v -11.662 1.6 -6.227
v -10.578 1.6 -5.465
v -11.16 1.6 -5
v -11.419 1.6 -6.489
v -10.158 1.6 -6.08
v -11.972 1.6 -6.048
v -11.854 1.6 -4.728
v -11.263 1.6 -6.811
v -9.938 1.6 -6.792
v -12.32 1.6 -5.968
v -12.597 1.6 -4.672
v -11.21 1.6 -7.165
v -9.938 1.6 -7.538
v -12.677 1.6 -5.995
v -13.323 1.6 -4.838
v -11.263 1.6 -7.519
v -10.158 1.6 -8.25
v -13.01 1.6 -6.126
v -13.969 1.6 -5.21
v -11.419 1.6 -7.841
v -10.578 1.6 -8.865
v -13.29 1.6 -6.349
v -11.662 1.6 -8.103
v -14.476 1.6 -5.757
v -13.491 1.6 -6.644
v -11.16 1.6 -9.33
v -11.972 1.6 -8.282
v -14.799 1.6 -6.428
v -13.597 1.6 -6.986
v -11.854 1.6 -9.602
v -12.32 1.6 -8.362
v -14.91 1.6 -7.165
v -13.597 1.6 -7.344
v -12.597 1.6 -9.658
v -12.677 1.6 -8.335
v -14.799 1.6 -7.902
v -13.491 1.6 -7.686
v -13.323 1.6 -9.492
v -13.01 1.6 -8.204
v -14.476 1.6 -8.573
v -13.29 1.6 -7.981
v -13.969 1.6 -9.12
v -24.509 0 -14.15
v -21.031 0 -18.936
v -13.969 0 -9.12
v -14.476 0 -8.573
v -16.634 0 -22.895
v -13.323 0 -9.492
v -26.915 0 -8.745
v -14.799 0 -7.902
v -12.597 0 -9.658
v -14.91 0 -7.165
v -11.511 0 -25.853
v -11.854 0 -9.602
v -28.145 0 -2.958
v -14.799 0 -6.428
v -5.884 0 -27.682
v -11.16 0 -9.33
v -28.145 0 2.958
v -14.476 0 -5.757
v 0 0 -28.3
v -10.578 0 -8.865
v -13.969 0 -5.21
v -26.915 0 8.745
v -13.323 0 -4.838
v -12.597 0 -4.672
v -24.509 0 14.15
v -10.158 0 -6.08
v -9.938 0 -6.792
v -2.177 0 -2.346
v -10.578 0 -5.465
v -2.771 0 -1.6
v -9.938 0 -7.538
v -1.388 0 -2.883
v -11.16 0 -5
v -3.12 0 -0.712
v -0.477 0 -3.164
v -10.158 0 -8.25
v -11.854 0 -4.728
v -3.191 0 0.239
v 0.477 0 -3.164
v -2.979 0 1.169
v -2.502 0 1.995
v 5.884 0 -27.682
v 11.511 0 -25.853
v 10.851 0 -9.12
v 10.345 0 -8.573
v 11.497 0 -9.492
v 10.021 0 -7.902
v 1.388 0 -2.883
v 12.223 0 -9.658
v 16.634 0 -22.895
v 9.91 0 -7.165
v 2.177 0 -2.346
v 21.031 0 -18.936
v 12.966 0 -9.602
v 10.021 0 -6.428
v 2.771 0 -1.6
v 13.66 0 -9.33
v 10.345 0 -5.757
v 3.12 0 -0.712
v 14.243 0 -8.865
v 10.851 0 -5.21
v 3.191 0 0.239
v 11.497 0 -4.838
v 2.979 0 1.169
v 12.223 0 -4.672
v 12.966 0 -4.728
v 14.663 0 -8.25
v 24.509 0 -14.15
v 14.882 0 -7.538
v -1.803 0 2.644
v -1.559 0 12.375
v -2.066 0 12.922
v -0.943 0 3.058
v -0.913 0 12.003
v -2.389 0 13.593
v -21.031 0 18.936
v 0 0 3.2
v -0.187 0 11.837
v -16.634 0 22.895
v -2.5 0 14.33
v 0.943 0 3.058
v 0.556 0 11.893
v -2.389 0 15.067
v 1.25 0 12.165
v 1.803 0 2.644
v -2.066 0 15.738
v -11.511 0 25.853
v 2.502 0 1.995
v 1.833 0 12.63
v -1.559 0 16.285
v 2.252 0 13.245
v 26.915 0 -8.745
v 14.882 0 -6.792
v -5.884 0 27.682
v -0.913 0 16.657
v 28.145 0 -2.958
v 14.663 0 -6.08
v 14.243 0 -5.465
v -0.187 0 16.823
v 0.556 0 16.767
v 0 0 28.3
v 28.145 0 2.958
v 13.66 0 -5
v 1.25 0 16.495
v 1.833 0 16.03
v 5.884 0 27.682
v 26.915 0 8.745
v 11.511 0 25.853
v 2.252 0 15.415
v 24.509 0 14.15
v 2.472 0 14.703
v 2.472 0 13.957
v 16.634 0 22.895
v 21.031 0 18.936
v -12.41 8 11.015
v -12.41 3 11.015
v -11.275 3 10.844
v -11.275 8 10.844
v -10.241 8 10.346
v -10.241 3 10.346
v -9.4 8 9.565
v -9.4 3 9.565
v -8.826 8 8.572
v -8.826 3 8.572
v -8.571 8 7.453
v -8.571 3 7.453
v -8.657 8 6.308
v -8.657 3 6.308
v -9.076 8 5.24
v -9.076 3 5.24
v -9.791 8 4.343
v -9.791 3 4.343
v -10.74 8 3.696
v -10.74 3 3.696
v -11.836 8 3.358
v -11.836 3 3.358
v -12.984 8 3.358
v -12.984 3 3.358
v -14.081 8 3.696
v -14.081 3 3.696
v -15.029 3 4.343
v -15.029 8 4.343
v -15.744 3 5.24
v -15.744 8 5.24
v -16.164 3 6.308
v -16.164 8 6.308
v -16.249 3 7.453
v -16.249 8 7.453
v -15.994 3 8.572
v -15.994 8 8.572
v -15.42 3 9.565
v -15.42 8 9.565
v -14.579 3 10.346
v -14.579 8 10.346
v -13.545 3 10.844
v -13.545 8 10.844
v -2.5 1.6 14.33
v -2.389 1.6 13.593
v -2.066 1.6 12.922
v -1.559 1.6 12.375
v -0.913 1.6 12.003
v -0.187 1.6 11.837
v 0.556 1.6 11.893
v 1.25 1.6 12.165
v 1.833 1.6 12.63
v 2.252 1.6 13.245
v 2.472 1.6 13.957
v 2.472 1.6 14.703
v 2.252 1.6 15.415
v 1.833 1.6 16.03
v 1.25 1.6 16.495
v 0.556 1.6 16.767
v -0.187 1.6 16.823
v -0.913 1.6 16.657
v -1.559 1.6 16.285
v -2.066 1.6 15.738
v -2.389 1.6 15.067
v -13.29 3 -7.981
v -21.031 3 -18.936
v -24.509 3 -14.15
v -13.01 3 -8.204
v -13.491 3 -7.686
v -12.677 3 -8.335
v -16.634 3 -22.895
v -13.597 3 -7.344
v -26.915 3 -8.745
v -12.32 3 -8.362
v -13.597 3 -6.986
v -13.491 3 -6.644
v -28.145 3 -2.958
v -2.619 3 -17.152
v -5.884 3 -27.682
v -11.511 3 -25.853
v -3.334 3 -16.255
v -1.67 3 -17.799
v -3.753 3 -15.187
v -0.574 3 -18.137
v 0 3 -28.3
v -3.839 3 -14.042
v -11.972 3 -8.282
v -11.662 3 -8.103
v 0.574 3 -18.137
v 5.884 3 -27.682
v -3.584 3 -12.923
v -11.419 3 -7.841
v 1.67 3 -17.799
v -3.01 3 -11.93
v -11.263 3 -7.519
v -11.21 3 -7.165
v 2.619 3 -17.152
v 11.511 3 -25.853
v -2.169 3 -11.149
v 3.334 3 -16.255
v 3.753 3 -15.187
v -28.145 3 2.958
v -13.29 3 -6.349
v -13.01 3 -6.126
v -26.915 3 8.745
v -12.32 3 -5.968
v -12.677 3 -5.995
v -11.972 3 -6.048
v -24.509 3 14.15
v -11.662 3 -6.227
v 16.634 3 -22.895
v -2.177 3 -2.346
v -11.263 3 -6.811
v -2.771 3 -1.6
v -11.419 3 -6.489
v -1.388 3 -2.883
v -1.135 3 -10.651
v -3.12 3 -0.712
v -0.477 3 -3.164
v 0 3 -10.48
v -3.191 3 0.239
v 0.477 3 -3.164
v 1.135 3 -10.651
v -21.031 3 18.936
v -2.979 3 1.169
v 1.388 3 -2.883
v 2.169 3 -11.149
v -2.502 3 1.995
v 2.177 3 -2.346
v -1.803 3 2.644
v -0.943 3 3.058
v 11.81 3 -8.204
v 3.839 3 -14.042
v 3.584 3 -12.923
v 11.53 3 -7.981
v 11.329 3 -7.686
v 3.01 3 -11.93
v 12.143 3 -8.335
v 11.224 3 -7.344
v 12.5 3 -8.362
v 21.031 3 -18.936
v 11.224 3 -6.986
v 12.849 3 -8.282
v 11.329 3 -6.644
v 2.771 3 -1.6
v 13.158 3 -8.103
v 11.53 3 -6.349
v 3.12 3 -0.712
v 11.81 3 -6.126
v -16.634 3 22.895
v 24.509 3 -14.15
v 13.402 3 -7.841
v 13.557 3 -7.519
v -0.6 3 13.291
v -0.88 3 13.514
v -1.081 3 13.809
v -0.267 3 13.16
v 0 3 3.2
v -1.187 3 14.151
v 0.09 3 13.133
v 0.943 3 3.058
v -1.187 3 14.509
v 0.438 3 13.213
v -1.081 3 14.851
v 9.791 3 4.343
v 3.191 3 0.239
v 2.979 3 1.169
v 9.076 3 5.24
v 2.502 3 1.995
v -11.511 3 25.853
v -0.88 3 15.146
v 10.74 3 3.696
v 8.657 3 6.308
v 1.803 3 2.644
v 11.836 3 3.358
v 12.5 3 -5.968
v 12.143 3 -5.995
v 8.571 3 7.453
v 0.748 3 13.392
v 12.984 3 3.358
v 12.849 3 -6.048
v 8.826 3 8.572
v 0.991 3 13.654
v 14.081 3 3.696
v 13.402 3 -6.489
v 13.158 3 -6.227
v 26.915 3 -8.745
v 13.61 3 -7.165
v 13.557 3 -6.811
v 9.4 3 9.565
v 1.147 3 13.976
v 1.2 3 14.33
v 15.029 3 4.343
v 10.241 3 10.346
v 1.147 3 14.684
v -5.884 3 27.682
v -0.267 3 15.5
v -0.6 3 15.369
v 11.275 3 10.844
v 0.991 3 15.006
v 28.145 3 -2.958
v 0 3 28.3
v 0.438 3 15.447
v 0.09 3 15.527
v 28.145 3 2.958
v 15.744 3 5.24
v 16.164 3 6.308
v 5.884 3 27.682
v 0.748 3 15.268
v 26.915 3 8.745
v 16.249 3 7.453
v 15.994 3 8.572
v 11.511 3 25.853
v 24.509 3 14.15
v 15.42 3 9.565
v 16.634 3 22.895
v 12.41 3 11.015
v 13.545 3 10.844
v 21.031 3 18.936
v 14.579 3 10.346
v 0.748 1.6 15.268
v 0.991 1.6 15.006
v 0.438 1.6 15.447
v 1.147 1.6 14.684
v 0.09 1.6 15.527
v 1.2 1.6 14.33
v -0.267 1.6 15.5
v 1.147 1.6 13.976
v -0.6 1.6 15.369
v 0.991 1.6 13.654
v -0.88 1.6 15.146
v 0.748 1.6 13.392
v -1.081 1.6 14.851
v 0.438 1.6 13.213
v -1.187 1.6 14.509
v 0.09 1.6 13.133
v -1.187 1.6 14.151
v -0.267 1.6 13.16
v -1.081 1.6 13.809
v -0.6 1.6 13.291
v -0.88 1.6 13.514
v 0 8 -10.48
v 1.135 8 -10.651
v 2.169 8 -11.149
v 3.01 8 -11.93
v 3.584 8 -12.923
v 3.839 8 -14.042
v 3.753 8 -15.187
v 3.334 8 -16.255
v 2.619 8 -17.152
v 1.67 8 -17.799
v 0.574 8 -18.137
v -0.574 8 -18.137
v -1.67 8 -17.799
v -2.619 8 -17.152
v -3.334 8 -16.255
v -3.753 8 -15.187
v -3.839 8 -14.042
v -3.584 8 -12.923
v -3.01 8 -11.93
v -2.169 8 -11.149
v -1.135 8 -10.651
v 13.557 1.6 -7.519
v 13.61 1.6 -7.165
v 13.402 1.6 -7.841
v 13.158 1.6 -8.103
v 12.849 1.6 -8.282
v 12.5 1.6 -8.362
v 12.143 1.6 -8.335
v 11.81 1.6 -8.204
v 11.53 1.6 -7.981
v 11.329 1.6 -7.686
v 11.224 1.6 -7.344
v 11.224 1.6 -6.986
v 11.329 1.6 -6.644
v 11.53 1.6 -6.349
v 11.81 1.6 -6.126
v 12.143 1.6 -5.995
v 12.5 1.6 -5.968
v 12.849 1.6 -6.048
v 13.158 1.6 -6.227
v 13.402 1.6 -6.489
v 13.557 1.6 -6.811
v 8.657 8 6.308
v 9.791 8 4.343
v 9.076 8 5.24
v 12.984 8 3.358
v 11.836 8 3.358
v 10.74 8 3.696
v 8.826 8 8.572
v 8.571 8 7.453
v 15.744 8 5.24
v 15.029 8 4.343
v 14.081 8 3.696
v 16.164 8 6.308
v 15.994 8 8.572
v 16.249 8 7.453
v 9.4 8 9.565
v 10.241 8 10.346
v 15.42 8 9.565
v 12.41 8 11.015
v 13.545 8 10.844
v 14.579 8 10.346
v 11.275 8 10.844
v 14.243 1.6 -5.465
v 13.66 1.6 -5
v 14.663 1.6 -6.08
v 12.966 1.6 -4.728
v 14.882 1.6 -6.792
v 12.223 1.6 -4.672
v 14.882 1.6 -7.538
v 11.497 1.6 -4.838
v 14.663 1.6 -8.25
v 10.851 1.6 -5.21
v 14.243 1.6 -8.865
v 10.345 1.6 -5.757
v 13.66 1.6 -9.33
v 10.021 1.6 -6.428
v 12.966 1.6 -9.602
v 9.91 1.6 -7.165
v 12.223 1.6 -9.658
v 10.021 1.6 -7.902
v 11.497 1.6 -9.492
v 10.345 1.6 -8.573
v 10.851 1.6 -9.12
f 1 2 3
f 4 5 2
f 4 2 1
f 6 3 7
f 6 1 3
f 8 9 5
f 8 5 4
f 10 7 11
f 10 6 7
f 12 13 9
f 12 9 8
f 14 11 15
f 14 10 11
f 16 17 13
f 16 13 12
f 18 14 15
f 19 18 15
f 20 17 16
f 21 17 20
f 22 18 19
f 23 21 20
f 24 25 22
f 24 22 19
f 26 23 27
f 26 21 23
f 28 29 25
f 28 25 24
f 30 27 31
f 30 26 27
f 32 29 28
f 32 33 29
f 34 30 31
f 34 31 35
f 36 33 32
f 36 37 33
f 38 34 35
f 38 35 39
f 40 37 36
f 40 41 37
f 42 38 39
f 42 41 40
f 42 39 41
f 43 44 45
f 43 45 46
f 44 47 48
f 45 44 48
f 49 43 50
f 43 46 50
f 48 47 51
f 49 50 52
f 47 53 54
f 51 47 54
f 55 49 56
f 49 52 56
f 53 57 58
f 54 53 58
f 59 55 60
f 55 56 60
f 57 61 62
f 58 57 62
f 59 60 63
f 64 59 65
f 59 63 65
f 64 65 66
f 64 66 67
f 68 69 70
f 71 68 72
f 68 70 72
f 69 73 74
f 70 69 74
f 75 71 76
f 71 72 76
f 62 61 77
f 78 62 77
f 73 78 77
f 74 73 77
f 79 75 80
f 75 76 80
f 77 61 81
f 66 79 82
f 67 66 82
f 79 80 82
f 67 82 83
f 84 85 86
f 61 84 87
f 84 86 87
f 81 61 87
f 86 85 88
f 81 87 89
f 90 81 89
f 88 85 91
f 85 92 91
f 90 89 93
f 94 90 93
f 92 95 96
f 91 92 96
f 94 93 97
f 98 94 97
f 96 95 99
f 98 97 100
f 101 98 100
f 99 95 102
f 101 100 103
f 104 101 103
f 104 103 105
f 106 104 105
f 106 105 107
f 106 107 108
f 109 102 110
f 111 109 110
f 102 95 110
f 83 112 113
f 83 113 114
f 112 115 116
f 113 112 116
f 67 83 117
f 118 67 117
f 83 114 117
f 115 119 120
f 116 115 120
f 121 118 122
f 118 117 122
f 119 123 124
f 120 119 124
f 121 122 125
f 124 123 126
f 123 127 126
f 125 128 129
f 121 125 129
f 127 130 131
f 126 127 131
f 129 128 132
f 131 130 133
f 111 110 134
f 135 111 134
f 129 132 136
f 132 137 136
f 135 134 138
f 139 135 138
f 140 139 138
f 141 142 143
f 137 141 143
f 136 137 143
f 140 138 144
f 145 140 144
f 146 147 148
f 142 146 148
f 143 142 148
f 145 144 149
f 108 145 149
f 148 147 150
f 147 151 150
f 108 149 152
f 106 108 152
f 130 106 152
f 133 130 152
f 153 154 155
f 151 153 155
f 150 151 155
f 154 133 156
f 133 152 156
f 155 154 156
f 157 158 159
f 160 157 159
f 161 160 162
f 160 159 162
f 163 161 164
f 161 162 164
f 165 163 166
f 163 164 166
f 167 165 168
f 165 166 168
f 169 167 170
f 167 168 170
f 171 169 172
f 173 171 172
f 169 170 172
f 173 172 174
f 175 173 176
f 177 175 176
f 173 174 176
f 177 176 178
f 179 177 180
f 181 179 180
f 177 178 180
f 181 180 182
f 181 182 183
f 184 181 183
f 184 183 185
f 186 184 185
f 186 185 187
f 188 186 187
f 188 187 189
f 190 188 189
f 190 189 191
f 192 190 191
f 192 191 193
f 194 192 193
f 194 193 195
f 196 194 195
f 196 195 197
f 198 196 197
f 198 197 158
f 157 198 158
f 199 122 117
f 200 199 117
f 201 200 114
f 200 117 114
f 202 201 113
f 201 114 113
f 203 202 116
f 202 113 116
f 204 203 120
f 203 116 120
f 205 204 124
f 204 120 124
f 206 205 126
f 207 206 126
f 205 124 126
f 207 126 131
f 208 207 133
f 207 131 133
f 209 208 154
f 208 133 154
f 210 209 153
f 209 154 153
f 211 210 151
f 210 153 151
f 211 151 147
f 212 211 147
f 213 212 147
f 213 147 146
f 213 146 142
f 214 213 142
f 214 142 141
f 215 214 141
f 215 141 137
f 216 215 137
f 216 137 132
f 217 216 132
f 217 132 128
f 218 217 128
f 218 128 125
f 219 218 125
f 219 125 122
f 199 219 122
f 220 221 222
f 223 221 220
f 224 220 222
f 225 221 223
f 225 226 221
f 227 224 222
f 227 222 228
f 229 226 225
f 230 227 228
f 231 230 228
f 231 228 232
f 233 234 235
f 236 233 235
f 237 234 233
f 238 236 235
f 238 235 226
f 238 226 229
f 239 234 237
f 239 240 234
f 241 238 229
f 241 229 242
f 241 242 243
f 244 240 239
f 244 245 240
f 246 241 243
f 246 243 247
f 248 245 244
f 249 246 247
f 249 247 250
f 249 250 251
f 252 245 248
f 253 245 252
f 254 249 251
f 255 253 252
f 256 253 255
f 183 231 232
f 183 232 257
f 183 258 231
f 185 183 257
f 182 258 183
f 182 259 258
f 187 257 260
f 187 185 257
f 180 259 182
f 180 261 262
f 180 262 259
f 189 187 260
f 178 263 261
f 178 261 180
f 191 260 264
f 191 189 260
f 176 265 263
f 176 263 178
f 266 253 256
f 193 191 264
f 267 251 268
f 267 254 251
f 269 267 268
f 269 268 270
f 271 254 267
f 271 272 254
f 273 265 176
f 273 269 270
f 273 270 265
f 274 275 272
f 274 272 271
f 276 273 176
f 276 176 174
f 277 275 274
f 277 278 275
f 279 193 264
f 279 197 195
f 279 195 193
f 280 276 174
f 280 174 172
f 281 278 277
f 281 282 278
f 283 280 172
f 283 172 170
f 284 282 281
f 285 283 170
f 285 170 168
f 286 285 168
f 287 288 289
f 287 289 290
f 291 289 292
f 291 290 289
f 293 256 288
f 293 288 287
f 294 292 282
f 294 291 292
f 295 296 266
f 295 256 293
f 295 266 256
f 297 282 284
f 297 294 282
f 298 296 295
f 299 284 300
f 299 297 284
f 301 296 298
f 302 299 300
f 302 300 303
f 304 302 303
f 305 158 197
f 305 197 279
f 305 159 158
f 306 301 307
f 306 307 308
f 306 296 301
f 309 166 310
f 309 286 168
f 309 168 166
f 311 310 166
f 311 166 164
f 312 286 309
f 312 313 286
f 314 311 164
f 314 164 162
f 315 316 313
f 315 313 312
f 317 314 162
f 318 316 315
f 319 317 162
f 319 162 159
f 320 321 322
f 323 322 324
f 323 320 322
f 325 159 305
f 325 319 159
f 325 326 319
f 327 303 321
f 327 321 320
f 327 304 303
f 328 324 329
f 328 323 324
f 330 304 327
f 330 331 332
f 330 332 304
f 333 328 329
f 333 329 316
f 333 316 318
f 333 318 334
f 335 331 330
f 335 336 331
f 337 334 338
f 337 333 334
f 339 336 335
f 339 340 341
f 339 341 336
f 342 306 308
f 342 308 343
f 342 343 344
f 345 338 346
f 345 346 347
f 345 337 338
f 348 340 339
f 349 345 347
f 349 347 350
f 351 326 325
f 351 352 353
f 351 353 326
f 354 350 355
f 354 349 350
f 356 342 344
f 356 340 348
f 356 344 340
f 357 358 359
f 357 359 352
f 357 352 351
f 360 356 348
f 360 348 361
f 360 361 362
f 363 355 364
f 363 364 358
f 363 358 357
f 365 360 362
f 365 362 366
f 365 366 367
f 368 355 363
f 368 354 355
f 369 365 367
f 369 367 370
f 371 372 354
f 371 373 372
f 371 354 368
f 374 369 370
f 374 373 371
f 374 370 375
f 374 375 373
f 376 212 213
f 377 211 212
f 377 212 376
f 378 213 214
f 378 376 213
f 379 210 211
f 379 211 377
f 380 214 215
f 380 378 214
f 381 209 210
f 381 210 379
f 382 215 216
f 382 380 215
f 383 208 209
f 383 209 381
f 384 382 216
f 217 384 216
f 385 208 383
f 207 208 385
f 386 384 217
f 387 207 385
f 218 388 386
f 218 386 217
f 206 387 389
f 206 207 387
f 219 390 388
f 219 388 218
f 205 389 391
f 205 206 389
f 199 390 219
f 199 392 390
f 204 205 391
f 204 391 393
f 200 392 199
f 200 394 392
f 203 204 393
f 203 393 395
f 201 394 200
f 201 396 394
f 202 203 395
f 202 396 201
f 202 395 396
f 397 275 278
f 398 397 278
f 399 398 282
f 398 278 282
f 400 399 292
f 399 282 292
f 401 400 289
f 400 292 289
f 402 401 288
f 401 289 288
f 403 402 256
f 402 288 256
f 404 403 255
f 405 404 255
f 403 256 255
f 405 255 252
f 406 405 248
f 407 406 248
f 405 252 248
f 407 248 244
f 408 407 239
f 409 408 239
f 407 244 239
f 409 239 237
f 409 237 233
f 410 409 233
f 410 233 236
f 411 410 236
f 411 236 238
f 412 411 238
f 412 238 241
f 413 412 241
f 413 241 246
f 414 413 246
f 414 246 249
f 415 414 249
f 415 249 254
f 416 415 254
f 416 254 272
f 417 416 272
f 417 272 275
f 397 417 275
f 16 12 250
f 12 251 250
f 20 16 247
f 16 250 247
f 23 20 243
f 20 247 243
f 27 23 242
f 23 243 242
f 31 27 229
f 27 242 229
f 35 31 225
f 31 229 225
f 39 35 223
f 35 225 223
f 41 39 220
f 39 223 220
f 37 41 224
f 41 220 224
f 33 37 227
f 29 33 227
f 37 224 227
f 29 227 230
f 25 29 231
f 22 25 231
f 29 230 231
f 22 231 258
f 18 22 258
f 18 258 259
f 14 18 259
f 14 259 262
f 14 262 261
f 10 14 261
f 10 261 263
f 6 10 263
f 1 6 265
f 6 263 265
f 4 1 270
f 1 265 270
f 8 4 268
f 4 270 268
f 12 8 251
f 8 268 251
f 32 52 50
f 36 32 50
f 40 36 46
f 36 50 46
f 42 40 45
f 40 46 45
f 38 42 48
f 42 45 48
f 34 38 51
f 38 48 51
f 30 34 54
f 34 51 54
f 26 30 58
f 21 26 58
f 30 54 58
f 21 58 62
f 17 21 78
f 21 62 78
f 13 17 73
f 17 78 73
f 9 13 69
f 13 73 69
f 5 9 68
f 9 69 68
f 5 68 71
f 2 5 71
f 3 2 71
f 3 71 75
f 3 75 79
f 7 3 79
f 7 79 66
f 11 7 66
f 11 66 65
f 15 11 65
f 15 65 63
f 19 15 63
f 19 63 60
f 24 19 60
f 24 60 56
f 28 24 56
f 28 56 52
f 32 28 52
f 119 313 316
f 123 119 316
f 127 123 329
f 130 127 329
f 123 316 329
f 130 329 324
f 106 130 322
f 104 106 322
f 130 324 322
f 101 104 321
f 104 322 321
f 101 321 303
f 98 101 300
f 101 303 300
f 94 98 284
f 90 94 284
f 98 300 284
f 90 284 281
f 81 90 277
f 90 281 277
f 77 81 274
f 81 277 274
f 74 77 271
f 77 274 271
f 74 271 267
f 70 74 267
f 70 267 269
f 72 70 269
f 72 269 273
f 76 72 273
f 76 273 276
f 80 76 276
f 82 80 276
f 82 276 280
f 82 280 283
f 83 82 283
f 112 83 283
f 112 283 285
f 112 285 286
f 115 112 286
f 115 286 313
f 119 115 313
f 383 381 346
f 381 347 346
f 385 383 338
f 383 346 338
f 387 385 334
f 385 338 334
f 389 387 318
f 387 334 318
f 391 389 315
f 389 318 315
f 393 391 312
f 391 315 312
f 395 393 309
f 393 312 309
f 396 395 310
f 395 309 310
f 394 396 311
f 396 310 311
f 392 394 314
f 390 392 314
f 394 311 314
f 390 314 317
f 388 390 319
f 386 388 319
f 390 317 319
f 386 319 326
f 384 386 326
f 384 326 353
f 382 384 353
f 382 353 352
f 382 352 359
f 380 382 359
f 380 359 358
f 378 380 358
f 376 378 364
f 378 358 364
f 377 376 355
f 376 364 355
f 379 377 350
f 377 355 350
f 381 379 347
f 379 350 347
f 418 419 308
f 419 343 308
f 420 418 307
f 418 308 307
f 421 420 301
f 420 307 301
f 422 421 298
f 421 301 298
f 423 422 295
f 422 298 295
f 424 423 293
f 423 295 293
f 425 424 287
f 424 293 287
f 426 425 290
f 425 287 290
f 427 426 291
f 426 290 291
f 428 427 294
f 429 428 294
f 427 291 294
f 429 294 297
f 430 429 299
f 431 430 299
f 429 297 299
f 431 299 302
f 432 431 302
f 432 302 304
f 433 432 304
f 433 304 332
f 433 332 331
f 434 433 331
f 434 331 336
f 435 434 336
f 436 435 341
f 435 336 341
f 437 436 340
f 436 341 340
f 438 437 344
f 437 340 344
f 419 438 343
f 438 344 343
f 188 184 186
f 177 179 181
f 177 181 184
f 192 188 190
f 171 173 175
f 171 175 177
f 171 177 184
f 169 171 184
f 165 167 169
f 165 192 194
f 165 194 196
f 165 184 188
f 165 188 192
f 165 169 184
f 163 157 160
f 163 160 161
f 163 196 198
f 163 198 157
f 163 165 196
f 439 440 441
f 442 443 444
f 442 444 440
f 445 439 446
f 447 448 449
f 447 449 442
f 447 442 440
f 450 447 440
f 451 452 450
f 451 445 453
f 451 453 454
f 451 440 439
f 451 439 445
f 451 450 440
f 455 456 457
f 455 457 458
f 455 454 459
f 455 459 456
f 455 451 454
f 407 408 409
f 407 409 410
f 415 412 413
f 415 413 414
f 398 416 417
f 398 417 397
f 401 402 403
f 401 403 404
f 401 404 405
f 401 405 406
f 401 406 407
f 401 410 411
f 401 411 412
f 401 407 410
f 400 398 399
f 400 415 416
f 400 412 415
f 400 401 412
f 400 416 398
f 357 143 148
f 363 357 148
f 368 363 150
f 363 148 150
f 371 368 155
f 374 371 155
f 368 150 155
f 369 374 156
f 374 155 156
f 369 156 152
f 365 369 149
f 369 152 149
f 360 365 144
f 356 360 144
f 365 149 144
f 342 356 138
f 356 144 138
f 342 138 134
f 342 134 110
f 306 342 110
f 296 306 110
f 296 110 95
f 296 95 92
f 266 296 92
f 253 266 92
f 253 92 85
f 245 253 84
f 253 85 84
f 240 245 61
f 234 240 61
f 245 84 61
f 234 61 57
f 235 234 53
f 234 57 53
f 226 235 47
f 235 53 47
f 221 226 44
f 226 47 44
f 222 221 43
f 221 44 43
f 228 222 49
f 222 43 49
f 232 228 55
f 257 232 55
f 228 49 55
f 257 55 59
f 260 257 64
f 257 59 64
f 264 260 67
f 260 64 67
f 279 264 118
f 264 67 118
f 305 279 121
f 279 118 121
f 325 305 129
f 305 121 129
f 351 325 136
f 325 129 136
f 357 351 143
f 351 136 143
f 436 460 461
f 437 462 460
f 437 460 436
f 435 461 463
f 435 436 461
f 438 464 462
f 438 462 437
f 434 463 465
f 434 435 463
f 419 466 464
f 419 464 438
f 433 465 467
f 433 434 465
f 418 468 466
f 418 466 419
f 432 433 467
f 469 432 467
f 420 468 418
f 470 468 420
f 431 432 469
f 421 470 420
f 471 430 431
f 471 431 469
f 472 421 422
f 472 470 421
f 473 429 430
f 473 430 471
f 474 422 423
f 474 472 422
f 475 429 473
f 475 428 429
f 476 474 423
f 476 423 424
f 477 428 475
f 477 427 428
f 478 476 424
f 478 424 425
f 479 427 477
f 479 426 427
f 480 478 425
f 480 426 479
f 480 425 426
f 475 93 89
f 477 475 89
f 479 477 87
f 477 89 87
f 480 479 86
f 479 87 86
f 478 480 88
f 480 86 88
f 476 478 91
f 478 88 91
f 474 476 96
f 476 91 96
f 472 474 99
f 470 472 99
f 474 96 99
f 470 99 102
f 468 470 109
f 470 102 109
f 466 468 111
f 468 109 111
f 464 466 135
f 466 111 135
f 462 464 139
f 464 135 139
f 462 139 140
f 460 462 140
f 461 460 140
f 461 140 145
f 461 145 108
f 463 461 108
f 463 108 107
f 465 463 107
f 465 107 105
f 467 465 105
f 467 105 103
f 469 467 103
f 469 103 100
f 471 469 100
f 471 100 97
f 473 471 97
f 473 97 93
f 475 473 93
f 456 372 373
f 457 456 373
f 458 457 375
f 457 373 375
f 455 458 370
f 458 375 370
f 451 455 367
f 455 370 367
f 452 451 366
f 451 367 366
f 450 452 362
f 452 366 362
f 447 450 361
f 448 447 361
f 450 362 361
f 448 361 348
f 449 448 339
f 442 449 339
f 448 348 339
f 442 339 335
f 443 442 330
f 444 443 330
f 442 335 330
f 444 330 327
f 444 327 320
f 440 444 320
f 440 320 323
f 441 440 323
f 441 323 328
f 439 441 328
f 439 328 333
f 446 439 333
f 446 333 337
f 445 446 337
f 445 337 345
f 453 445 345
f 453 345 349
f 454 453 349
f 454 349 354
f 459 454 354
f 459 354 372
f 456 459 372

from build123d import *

# Parameters (mm, degrees)
SKETCH_1_R                   = 3.85
EXTRUDE_1_DEPTH              = 8
EXTRUDE_1_2_DEPTH            = 8
EXTRUDE_1_3_DEPTH            = 8
SKETCH_1_3_R                 = 28.3
SKETCH_1_3_R_2               = 3.85
SKETCH_1_3_R_3               = 0.5
EXTRUDE_2_DEPTH              = 3
SKETCH_2_R                   = 3.2
CUT_EXTRUDE_1_DEPTH          = 41.333360882
HOLE_WIZARD_M2_1_D           = 2.4
HOLE_WIZARD_M2_1_DEPTH       = 3
HOLE_WIZARD_M2_1_CBORE_D     = 5
HOLE_WIZARD_M2_1_CBORE_DEPTH = 1.6
HOLE_WIZARD_M2_1_TIP         = 0.721032743


with BuildPart() as part:
    # 스케치1 → 보스-돌출1 (new body)
    with BuildSketch(Plane(origin=(0, 0, 0), x_dir=(1, 0, 0), z_dir=(0, 1, 0))):
        with Locations((0, 14.33)):
            Circle(SKETCH_1_R)
    extrude(amount=EXTRUDE_1_DEPTH)



with BuildPart() as body_2:
    # 스케치1 → Extrude 1 2 (new body)
    with BuildSketch(Plane(origin=(0, 0, 0), x_dir=(1, 0, 0), z_dir=(0, 1, 0))):
        with Locations((12.410144036, -7.165)):
            Circle(SKETCH_1_R)
    extrude(amount=EXTRUDE_1_2_DEPTH)


with BuildPart() as body_3:
    # 스케치1 → Extrude 1 3 (new body)
    with BuildSketch(Plane(origin=(0, 0, 0), x_dir=(1, 0, 0), z_dir=(0, 1, 0))):
        with Locations((-12.410144036, -7.165)):
            Circle(SKETCH_1_R)
    extrude(amount=EXTRUDE_1_3_DEPTH)


with BuildPart() as part_1:
    add(part.part)

    add(body_2.part)  # 보스-돌출2 merges body 2

    add(body_3.part)  # 보스-돌출2 merges body 3
    # 스케치1<3> → 보스-돌출2 (add)
    with BuildSketch(Plane(origin=(0, 0, 0), x_dir=(1, 0, 0), z_dir=(0, 1, 0))):
        Circle(SKETCH_1_3_R)
        with Locations((-12.410144036, -7.165)):
            Circle(SKETCH_1_3_R_2, mode=Mode.SUBTRACT)
        with Locations((0, -14.33)):
            Circle(SKETCH_1_3_R_3, mode=Mode.SUBTRACT)
        with Locations((12.410144036, -7.165)):
            Circle(SKETCH_1_3_R_2, mode=Mode.SUBTRACT)
        with Locations((-12.410144036, 7.165)):
            Circle(SKETCH_1_3_R_3, mode=Mode.SUBTRACT)
        with Locations((12.410144036, 7.165)):
            Circle(SKETCH_1_3_R_3, mode=Mode.SUBTRACT)
        with BuildLine():
            ThreePointArc((0, 18.18), (2.722361108, 17.052361108), (3.85, 14.33))
            ThreePointArc((3.85, 14.33), (-2.722361108, 11.607638892), (0, 18.18))
        make_face(mode=Mode.SUBTRACT)
    extrude(amount=EXTRUDE_2_DEPTH)

    # 스케치2 → 컷-돌출1 (cut, through all)
    with BuildSketch(Plane(origin=(0, 3, 0), x_dir=(1, 0, 0), z_dir=(0, 1, 0))):
        Circle(SKETCH_2_R)
    extrude(amount=-CUT_EXTRUDE_1_DEPTH, mode=Mode.SUBTRACT)

    # M2 남비 머리 나사용 카운터보어1
    with Locations(Plane(origin=(0, 0, 0), x_dir=(-1, 0, 0), z_dir=(0, -1, 0))):
        with Locations((0, -14.33), (12.410144036, 7.165), (-12.410144036, 7.165)):
            CounterBoreHole(HOLE_WIZARD_M2_1_D / 2, HOLE_WIZARD_M2_1_CBORE_D / 2, HOLE_WIZARD_M2_1_CBORE_DEPTH, depth=HOLE_WIZARD_M2_1_DEPTH)
            with Locations((0, 0, -(HOLE_WIZARD_M2_1_DEPTH + HOLE_WIZARD_M2_1_TIP / 2))):  # 118° drill point
                Cone(0, HOLE_WIZARD_M2_1_D / 2, HOLE_WIZARD_M2_1_TIP, mode=Mode.SUBTRACT)


solid = part_1.part
